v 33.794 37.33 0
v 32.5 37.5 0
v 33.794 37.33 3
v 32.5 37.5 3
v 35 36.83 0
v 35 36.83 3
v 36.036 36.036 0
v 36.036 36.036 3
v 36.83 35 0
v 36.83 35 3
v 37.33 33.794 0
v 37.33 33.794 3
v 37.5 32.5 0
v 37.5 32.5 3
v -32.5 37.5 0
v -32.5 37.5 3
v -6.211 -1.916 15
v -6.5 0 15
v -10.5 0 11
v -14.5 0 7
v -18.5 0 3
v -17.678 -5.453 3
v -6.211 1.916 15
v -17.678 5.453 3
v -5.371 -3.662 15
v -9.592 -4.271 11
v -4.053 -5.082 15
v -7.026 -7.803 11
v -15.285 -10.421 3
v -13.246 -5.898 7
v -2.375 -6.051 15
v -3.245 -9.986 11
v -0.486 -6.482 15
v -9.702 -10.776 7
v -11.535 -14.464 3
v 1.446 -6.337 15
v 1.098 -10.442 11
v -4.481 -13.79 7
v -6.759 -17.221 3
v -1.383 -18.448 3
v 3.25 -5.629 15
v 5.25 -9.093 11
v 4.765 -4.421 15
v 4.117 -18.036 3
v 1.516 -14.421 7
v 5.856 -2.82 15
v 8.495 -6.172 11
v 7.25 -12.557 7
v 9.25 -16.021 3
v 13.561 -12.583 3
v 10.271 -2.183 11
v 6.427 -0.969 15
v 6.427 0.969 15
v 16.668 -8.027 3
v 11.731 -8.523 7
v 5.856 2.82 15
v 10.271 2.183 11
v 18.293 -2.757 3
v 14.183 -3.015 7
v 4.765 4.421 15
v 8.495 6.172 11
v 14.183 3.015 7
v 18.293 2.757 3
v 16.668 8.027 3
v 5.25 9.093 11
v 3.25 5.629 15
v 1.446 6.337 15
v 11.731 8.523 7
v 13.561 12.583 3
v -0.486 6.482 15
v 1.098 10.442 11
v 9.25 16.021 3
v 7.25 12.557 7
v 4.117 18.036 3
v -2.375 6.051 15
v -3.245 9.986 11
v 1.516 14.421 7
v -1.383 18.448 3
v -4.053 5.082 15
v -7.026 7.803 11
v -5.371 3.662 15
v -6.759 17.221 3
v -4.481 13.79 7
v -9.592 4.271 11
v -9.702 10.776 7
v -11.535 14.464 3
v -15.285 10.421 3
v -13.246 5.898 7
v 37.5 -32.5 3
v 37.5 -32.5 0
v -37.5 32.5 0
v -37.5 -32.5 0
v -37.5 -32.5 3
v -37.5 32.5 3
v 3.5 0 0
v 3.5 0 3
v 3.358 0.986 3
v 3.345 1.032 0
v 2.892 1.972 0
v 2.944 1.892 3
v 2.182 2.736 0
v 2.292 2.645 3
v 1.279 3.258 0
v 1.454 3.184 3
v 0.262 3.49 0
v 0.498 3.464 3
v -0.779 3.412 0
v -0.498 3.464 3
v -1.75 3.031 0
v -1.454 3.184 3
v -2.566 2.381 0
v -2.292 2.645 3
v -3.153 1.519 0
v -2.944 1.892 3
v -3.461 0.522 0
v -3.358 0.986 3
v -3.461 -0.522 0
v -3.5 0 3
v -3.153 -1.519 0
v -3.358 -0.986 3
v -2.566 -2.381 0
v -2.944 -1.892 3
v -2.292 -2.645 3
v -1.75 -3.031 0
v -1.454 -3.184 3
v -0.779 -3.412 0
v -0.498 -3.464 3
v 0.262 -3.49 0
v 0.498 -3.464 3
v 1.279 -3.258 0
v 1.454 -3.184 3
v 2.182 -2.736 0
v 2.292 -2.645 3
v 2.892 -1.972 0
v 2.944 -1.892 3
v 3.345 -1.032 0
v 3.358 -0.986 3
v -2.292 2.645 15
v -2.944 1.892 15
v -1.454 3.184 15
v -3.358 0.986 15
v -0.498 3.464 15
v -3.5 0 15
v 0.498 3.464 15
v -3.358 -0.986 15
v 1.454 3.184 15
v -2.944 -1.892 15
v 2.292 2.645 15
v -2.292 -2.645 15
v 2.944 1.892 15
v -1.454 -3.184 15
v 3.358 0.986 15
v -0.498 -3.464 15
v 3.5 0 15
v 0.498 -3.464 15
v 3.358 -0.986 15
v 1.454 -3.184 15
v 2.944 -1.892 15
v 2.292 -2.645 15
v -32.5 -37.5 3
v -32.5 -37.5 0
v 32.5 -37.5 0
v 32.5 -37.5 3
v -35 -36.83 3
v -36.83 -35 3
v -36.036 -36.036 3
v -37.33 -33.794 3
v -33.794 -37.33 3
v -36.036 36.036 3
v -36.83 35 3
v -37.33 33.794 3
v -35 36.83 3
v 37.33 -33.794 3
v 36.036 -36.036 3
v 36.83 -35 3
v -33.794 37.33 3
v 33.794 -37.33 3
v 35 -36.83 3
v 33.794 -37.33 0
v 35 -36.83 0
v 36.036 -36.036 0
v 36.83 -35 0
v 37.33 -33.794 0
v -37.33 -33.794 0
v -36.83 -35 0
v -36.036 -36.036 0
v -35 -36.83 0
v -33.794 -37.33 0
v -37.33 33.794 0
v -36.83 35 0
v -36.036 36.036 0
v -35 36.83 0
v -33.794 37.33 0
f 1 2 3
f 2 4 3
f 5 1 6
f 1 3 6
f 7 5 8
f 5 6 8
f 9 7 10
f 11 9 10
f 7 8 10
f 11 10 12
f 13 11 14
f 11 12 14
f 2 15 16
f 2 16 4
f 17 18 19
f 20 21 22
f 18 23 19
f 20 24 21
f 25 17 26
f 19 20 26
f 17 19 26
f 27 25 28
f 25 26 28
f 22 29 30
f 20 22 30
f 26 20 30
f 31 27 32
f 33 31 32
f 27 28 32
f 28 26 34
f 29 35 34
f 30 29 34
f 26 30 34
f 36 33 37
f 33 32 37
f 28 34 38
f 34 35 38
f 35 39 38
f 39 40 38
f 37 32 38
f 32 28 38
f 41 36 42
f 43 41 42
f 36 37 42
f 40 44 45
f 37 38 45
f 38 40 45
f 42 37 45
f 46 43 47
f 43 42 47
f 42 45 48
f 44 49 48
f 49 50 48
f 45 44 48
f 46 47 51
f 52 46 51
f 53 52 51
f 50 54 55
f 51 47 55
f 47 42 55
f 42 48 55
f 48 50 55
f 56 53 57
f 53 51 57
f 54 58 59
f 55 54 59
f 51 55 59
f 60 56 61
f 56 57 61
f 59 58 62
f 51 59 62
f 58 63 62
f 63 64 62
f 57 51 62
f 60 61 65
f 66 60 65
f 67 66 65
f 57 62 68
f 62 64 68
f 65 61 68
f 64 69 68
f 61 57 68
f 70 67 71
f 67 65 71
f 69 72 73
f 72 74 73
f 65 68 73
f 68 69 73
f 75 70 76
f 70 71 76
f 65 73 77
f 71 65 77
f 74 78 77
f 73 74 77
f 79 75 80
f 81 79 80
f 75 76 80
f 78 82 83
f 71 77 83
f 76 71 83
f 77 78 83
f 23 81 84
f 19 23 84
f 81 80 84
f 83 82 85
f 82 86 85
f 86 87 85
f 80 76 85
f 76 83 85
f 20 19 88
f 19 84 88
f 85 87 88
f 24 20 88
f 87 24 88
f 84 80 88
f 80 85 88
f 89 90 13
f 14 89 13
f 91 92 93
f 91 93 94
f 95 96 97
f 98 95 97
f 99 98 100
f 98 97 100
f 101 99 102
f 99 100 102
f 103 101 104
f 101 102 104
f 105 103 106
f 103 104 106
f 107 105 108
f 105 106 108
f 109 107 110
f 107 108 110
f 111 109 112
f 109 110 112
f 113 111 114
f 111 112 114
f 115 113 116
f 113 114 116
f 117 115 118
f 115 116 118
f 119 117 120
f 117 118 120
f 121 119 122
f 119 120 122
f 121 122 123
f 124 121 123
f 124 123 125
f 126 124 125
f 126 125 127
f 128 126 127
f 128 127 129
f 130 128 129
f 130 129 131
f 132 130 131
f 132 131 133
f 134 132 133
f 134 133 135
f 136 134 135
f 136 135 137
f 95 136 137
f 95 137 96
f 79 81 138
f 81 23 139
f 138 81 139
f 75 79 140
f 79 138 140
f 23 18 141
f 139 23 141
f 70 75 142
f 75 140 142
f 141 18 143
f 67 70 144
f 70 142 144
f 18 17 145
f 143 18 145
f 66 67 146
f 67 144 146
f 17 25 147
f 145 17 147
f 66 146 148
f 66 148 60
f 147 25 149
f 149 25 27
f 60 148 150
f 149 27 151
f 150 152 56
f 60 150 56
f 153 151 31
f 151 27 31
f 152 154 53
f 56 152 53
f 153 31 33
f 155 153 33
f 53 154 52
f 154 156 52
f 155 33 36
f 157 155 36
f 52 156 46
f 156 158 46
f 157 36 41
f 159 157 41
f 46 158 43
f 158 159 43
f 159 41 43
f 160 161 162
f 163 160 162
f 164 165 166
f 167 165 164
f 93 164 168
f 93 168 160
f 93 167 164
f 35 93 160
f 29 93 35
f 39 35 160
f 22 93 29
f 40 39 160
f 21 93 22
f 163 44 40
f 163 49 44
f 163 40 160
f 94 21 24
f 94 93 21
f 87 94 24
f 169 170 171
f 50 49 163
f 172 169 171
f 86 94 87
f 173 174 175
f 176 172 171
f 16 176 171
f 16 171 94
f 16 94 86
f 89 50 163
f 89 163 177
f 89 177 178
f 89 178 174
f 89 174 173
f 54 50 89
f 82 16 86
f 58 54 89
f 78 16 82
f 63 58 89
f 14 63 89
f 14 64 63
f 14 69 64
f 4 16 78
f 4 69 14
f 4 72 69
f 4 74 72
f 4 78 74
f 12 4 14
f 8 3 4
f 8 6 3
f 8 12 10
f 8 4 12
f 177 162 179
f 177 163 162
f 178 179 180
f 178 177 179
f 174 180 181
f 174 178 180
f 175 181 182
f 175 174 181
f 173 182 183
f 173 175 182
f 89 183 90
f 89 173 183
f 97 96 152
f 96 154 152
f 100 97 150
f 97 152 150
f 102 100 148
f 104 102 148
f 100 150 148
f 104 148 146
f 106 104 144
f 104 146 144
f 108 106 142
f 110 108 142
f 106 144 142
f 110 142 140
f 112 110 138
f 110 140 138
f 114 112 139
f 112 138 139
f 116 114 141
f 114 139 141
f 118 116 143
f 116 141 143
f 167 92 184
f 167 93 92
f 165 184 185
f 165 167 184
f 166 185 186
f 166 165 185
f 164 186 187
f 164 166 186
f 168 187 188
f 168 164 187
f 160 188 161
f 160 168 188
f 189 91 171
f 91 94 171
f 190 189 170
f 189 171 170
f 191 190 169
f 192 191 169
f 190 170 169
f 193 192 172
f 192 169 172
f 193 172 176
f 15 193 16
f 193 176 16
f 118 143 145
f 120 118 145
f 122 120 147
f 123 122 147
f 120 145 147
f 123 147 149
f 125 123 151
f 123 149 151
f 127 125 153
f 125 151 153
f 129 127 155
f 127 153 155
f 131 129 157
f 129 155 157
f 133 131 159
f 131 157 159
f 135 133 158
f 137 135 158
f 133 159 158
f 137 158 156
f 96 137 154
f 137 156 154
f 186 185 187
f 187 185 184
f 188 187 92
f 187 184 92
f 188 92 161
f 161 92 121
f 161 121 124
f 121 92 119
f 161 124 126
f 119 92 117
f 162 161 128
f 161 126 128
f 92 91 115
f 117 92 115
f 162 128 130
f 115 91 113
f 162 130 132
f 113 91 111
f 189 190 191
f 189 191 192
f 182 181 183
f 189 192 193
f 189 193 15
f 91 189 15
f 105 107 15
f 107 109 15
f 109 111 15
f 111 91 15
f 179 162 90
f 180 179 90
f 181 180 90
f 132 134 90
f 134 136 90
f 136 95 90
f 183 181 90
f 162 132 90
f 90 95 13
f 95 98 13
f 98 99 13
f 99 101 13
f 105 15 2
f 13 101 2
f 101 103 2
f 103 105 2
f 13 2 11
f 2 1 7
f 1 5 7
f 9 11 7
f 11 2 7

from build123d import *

# Parameters (mm, degrees)
F0_W     = 75
F0_H     = 75
F1_DEPTH = 3
F4_R     = 3.5
F5_DEPTH = 15.001
F6_R     = 5


with BuildPart() as f1:
    # F0 (on Top) → F1 (new body)
    with BuildSketch(Plane.XY):
        Rectangle(F0_W, F0_H)
    extrude(amount=F1_DEPTH)

    # F2 (on Front) → F3 (revolve)
    with BuildSketch(Plane.XZ):
        Polygon((-6.5, 15), (-18.5, 3), (-3.5, 3), (-3.5, 15), align=None)
    revolve(axis=Axis((0, 0, 28.255757), (0, 0, 1)))

    # F4 (on face) → F5 (cut, through all)
    with BuildSketch(Plane.XY.offset(15)):
        Circle(F4_R)
    extrude(amount=-F5_DEPTH, mode=Mode.SUBTRACT)

    # F6
    f6_edges = [f1.edges().sort_by_distance(p)[0] for p in [
        (-37.5, 37.5, 1.5),
        (-37.5, -37.5, 1.5),
        (37.5, -37.5, 1.5),
        (37.5, 37.5, 1.5),
    ]]
    fillet(f6_edges, radius=F6_R)


solid = f1.part
